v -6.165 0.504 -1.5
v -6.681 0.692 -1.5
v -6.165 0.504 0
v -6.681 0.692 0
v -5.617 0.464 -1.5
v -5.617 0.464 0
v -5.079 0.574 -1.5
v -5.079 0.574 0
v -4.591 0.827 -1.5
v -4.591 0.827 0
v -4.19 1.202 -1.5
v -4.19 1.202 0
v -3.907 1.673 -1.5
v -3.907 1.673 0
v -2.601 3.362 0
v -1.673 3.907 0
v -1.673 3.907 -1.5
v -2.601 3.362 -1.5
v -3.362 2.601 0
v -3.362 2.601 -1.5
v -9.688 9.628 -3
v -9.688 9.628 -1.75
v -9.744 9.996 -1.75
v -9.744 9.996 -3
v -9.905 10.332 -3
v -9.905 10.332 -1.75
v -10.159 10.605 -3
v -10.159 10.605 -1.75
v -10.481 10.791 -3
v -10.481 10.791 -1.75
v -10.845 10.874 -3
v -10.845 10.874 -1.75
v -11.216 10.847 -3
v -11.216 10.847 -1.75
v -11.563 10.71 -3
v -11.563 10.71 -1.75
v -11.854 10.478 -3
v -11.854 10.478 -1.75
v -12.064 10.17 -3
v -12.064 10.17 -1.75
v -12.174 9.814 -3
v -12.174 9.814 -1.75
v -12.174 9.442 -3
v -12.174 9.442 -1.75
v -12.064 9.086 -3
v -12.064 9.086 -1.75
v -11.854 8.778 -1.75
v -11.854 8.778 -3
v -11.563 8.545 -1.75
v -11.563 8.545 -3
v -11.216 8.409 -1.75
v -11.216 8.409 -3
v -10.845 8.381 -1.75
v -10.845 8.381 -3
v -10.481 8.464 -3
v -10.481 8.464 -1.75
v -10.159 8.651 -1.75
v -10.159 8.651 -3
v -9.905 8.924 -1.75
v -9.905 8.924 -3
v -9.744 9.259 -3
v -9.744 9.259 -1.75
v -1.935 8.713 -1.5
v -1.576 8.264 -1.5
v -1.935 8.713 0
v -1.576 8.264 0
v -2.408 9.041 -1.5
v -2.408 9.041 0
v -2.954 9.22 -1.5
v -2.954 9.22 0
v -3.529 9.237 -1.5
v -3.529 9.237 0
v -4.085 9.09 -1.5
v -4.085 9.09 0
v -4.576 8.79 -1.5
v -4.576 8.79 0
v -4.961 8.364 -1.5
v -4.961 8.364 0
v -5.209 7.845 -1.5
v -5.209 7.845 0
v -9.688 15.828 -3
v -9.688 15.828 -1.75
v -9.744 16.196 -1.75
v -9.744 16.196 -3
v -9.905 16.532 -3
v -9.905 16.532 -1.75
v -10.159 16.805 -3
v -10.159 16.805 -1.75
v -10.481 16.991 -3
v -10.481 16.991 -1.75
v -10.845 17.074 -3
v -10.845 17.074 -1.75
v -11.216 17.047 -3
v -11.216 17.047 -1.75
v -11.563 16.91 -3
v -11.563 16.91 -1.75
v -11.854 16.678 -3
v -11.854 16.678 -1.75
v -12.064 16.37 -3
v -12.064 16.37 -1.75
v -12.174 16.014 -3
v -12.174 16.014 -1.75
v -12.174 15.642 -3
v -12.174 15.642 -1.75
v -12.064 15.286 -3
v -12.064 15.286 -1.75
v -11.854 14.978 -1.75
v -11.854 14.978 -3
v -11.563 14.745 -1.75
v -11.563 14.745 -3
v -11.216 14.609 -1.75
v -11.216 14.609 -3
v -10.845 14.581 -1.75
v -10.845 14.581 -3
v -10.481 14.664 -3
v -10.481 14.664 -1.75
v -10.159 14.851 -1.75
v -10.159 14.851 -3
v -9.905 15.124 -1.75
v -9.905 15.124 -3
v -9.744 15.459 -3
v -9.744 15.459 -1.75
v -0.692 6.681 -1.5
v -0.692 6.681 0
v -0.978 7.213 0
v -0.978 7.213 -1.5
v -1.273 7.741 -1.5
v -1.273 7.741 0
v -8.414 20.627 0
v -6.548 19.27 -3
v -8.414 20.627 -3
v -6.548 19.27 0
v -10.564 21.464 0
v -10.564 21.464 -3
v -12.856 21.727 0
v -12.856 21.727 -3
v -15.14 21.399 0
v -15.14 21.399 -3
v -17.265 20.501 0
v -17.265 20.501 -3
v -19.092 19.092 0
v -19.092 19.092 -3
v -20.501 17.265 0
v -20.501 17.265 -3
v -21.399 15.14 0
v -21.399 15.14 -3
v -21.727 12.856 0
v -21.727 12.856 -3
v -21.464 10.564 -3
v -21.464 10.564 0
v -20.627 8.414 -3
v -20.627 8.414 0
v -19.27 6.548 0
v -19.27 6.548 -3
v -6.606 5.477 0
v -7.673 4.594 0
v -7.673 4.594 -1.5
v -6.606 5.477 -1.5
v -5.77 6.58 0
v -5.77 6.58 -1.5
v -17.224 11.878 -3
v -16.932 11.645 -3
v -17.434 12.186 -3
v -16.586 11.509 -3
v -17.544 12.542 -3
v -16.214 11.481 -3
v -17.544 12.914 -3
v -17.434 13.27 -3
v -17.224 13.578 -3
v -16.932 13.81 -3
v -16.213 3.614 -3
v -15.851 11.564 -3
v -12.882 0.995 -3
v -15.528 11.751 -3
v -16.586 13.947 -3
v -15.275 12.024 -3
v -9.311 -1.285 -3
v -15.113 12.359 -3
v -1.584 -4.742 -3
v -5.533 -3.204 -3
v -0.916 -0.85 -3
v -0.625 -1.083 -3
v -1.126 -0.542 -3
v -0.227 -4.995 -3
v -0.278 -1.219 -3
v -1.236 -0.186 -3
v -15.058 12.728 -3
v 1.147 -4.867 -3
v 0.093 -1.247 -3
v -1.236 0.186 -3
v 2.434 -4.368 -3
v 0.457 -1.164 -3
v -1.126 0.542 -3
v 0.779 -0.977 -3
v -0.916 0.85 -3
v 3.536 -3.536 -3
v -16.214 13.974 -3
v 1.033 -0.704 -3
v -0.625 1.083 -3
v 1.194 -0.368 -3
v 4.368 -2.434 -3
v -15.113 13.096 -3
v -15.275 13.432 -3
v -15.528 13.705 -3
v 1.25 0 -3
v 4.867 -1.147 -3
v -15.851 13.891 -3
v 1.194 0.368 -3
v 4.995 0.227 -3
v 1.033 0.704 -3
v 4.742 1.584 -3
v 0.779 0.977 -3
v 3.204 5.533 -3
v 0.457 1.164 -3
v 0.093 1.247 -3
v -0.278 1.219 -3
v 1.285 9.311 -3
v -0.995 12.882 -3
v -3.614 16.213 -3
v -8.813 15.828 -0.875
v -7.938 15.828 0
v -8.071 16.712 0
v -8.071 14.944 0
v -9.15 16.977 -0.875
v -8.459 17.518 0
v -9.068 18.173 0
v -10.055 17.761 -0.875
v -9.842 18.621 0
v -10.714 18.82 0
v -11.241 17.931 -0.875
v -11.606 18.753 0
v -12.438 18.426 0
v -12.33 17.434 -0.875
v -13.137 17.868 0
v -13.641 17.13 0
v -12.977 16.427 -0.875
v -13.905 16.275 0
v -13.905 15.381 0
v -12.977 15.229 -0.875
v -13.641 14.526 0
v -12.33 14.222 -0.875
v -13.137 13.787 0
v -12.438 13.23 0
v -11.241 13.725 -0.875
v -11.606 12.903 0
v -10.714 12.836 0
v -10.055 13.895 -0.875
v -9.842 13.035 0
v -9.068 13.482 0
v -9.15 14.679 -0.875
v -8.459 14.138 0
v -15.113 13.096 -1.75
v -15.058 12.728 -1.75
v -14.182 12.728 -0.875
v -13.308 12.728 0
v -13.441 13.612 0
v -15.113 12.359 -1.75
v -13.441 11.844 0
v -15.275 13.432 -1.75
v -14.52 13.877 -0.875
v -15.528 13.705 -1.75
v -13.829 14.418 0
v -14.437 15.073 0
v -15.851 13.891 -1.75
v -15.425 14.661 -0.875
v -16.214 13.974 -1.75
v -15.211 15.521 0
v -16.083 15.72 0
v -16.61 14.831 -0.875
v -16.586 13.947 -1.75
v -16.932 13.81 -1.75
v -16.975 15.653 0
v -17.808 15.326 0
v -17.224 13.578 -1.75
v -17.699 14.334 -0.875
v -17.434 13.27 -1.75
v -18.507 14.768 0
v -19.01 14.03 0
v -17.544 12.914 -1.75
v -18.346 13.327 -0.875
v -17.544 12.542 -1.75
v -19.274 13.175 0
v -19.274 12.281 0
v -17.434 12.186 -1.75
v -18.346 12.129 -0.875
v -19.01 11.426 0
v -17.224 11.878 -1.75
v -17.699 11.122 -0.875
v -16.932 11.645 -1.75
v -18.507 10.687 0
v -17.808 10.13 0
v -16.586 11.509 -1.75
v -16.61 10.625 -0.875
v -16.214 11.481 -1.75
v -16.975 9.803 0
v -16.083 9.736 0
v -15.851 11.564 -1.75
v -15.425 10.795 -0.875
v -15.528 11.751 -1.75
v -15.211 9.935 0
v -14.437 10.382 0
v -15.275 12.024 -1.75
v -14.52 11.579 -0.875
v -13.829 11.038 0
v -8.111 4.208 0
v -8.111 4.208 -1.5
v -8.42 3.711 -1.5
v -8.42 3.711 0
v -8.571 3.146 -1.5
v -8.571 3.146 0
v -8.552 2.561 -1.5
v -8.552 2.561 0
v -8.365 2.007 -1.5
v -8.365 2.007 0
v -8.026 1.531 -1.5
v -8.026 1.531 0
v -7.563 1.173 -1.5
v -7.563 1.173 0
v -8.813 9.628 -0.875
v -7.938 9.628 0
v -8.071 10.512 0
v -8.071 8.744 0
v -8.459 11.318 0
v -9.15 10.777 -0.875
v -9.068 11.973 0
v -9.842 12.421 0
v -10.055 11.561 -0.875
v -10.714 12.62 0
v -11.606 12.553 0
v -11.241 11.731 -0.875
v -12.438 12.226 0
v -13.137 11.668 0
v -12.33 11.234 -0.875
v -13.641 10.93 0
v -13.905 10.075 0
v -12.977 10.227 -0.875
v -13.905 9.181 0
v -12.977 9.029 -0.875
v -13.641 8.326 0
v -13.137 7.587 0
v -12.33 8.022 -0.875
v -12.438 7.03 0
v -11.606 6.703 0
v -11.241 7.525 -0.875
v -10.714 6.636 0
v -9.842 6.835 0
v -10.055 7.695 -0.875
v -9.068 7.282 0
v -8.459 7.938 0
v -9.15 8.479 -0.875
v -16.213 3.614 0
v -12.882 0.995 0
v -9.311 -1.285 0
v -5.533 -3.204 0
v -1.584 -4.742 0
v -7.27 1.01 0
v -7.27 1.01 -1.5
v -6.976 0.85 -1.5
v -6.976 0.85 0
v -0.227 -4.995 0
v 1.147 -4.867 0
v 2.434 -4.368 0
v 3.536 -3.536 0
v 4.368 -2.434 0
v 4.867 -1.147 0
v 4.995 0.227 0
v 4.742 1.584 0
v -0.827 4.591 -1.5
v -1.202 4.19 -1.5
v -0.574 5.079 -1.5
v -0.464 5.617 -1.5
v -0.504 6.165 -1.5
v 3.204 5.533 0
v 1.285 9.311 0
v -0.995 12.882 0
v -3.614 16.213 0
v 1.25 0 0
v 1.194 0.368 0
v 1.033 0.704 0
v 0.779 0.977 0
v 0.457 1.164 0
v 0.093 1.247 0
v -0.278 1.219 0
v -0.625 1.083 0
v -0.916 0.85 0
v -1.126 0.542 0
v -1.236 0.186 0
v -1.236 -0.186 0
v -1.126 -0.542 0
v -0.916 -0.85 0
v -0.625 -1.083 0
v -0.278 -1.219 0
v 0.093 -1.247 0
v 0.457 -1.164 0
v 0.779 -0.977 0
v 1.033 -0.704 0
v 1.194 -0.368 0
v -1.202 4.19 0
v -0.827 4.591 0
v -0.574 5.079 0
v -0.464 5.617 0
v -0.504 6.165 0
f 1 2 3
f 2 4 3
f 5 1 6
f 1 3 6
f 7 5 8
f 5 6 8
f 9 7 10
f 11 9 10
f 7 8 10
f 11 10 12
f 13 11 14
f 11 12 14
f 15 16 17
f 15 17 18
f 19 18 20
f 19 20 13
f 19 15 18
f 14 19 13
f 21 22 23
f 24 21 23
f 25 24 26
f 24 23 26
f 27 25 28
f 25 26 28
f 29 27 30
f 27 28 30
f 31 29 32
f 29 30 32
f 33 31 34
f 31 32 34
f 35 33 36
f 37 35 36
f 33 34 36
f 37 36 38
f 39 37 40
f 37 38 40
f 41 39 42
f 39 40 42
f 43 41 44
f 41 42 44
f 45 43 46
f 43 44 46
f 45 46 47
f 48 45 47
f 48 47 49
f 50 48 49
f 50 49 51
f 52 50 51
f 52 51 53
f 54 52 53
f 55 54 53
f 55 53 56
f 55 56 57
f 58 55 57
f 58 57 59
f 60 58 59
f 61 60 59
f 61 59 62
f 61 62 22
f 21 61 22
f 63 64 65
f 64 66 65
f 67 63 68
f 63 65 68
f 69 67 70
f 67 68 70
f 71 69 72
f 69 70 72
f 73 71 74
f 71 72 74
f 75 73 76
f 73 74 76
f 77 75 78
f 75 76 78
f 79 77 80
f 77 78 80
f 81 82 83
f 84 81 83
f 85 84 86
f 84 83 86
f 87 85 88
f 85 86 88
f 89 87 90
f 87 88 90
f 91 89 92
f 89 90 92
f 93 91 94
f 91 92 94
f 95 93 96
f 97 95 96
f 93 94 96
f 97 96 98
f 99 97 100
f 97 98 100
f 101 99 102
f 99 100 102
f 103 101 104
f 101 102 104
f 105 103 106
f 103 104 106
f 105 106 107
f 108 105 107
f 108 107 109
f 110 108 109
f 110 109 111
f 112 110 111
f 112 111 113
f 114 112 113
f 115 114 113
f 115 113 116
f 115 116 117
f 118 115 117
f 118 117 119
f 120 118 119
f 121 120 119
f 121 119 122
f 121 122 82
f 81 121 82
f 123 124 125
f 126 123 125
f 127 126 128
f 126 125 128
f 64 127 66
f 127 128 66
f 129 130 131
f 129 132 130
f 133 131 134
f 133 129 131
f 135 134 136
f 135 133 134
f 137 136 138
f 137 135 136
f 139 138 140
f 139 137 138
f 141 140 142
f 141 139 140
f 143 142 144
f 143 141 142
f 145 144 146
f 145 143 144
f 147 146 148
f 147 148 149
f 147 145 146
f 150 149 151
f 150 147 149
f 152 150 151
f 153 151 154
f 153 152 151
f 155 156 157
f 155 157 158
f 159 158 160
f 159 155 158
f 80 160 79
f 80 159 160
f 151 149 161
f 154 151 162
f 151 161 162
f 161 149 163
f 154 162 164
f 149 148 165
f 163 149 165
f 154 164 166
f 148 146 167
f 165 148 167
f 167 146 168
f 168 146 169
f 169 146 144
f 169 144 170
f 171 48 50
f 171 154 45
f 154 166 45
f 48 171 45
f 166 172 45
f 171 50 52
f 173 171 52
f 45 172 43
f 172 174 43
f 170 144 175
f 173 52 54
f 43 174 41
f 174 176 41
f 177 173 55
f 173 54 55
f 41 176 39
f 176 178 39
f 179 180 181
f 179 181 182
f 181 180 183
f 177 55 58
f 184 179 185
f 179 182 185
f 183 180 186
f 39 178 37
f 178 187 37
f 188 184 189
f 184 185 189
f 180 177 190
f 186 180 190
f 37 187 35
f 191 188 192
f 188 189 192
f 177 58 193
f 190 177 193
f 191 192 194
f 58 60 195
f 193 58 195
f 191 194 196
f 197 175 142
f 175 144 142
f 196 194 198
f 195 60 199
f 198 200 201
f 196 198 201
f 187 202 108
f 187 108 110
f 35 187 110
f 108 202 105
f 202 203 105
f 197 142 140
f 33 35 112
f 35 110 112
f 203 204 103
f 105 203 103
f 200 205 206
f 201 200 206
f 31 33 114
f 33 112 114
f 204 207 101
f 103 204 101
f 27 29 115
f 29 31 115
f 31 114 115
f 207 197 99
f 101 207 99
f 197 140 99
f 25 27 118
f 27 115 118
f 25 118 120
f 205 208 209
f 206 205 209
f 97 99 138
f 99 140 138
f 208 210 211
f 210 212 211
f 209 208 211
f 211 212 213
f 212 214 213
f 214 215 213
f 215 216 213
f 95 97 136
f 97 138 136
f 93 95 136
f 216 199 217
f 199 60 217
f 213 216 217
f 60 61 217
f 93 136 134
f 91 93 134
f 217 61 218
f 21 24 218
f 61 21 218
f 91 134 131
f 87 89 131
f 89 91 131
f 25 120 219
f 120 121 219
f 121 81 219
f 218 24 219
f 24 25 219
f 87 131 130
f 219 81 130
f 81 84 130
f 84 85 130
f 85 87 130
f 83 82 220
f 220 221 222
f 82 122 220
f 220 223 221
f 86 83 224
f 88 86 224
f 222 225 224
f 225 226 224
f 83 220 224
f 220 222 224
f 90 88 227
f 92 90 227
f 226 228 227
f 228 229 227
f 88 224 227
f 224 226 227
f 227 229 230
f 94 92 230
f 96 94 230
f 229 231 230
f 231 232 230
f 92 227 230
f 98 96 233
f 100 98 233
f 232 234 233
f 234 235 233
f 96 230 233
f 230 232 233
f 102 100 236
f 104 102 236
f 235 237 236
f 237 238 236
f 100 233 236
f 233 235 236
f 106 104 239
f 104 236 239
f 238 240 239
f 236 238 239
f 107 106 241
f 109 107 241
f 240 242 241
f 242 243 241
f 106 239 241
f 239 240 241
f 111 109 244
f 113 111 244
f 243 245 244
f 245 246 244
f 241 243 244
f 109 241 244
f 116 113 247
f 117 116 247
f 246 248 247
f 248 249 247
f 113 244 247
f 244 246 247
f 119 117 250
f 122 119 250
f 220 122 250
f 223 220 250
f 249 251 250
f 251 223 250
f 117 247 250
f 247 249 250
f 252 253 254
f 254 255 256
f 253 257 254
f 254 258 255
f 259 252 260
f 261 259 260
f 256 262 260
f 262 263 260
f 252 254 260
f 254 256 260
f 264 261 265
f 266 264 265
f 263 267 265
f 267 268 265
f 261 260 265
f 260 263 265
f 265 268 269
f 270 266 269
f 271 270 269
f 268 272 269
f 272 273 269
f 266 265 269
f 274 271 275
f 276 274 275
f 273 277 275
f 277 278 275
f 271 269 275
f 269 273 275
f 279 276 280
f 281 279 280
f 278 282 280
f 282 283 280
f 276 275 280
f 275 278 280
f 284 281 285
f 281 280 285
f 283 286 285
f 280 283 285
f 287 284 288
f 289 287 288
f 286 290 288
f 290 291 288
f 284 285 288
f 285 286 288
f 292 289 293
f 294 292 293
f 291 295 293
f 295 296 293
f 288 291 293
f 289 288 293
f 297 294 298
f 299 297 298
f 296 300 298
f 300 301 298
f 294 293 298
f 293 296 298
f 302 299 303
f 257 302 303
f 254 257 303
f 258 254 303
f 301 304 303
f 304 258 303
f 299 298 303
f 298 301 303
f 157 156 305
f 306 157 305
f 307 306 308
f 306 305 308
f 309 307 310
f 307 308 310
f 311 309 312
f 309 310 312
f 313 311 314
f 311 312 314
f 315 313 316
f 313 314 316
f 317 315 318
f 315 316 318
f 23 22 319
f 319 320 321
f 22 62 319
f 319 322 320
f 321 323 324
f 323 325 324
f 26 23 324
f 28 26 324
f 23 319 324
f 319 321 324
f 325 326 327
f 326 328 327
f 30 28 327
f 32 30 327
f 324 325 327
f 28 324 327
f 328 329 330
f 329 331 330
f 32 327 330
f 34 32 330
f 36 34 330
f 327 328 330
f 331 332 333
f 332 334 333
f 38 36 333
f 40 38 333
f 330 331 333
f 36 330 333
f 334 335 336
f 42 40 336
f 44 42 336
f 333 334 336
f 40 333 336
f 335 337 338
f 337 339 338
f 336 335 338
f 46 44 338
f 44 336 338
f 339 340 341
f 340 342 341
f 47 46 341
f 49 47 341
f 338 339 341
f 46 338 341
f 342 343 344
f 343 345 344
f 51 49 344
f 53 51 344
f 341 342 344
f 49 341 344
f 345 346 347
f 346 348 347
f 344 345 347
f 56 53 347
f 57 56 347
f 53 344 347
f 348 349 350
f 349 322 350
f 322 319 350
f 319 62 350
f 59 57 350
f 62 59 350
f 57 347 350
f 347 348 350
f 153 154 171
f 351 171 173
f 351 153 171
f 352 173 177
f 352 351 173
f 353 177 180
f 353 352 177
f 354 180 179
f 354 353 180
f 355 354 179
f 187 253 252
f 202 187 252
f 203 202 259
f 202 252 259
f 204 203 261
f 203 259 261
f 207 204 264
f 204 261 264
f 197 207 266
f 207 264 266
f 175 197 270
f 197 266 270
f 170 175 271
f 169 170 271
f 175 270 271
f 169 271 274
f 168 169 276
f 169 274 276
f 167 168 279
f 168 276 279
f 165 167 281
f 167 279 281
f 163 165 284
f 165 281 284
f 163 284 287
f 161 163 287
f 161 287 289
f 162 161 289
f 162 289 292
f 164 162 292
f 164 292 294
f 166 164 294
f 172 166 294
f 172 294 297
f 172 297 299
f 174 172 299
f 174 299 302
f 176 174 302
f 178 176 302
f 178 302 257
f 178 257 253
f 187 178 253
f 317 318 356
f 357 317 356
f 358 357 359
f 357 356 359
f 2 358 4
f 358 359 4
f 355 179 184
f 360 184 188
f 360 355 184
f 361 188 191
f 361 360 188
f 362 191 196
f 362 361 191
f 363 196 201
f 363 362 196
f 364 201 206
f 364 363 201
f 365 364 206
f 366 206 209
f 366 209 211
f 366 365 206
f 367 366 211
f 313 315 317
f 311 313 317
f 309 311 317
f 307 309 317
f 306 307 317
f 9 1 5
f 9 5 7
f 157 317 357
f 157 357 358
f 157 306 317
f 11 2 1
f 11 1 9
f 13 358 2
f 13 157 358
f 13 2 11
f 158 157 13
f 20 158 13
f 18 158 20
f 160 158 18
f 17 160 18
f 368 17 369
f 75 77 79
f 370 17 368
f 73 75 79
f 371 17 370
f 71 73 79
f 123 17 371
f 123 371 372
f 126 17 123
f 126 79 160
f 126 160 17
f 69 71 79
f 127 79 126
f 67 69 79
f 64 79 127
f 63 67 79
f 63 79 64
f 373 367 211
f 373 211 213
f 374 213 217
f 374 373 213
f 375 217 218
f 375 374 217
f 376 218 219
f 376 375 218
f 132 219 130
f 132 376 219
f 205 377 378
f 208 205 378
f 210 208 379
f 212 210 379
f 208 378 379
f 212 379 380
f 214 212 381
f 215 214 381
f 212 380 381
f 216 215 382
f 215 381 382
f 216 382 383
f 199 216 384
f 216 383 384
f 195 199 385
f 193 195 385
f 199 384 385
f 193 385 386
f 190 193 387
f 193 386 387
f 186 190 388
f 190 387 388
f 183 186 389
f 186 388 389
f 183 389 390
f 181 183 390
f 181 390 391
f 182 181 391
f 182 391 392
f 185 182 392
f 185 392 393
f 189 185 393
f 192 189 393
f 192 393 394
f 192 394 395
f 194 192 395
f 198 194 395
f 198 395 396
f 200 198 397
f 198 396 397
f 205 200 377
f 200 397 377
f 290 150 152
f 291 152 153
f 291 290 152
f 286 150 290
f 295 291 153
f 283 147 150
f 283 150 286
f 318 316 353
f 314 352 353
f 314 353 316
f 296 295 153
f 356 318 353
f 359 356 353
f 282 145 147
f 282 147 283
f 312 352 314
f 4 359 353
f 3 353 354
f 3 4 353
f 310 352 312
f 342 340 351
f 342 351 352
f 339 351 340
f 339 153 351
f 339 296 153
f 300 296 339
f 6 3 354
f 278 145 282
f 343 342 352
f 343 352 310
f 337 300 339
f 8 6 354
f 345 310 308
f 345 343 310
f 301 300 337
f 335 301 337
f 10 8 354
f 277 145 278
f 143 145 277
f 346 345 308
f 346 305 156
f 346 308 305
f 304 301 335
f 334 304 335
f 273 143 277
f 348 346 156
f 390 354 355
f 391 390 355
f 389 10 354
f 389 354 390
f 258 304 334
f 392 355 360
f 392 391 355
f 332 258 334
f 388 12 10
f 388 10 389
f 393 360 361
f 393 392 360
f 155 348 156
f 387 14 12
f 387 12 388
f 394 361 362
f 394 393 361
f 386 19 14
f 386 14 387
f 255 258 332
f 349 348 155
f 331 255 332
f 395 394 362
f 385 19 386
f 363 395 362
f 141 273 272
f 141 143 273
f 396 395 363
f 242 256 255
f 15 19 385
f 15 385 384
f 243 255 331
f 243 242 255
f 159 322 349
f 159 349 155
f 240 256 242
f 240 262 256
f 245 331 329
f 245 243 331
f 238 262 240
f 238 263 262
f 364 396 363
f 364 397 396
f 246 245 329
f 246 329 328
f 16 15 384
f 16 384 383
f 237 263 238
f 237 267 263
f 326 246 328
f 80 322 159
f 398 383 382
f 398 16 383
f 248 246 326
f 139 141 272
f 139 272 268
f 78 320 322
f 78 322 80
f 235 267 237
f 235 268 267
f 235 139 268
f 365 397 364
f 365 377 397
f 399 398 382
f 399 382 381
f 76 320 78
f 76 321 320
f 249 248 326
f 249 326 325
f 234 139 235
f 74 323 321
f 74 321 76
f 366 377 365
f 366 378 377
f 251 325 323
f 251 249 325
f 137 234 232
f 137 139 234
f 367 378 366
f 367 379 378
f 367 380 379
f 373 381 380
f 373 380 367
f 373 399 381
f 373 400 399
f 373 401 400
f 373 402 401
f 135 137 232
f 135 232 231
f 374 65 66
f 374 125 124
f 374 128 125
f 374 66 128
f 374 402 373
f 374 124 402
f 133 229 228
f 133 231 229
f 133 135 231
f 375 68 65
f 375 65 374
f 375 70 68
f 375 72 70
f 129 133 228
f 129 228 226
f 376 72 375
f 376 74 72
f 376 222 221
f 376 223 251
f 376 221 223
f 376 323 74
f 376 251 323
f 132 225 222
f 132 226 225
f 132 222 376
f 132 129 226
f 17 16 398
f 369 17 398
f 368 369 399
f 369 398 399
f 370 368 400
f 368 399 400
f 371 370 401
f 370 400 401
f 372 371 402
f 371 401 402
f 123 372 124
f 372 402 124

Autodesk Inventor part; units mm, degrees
ref_plane "YZ Plane" through (0, 0, 0) normal (1, 0, 0) x (0, 1, 0)
ref_plane "XZ Plane" through (0, 0, 0) normal (0, 1, 0) x (-1, 0, 0)
ref_plane "XY Plane" through (0, 0, 0) normal (0, 0, 1) x (1, 0, 0)
sketch "Sketch2" plane through (0, 0, 0) normal (0, 0, 1) x (1, 0, 0)
  line L0 (0, 0) -> (-12.7279, 12.7279) construction
  line L1 (0, 0) -> (18, 0) construction
  line L2 (0, 0) -> (-12.7279, 12.7279) construction
  line L3 (-3.5355, -3.5355) -> (-16.2635, 9.1924) construction
  line L4 (-9.1924, 16.2635) -> (3.5355, 3.5355) construction
  arc A0 (-3.5355, -3.5355) -> (-1.5844, -4.7423) centre (0, 0) ccw construction
  arc A1 (-9.1924, 16.2635) -> (-16.2635, 9.1924) centre (-12.7279, 12.7279) ccw
  arc A2 (-6.5476, 19.2704) -> (-19.2704, 6.5476) centre (-12.7279, 12.7279) ccw
  arc A3 (-19.2704, 6.5476) -> (-1.5844, -4.7423) centre (12.0821, 36.1644) ccw
  arc A4 (4.7423, 1.5844) -> (-6.5476, 19.2704) centre (-36.1644, -12.0821) ccw
  arc A5 (-3.9009, 10.972) -> (-6.5476, 19.2704) centre (-12.7279, 12.7279) ccw construction
  arc A6 (-6.364, 6.364) -> (-3.9009, 10.972) centre (-12.7279, 12.7279) ccw construction
  arc A7 (-10.972, 3.9009) -> (-6.364, 6.364) centre (-12.7279, 12.7279) ccw construction
  arc A8 (-19.2704, 6.5476) -> (-10.972, 3.9009) centre (-12.7279, 12.7279) ccw construction
  arc A9 (4.7423, 1.5844) -> (3.5355, 3.5355) centre (0, 0) ccw construction
  circle A10 centre (0, 0) radius 5
  circle A11 centre (0, 0) radius 3.025 construction
  circle A12 centre (0, 0) radius 1.25
  line L5 (0, 0) -> (-12.7279, 12.7279) construction
  line L6 (0, 0) -> (18, 0) construction
  line L7 (0, 0) -> (-12.7279, 12.7279) construction
  line L8 (-3.5355, -3.5355) -> (-16.2635, 9.1924) construction
  line L9 (-9.1924, 16.2635) -> (3.5355, 3.5355) construction
  arc A13 (-3.5355, -3.5355) -> (-1.5844, -4.7423) centre (0, 0) ccw construction
  arc A14 (-9.1924, 16.2635) -> (-16.2635, 9.1924) centre (-12.7279, 12.7279) ccw
  arc A15 (-6.5476, 19.2704) -> (-19.2704, 6.5476) centre (-12.7279, 12.7279) ccw
  circle A16 centre (-10.9381, 15.8279) radius 1.25
  circle A17 centre (-10.9381, 15.8279) radius 3.1 construction
  circle A18 centre (-16.3075, 12.7279) radius 1.25
  circle A19 centre (-16.3075, 12.7279) radius 3.1 construction
  circle A20 centre (-10.9381, 9.6279) radius 1.25
  circle A21 centre (-10.9381, 9.6279) radius 3.1 construction
  arc A22 (-19.2704, 6.5476) -> (-1.5844, -4.7423) centre (12.0821, 36.1644) ccw
  arc A23 (4.7423, 1.5844) -> (-6.5476, 19.2704) centre (-36.1644, -12.0821) ccw
  arc A24 (-3.9009, 10.972) -> (-6.5476, 19.2704) centre (-12.7279, 12.7279) ccw construction
  arc A25 (-6.364, 6.364) -> (-3.9009, 10.972) centre (-12.7279, 12.7279) ccw construction
  arc A26 (-10.972, 3.9009) -> (-6.364, 6.364) centre (-12.7279, 12.7279) ccw construction
  arc A27 (-19.2704, 6.5476) -> (-10.972, 3.9009) centre (-12.7279, 12.7279) ccw construction
  arc A28 (4.7423, 1.5844) -> (3.5355, 3.5355) centre (0, 0) ccw construction
  circle A29 centre (0, 0) radius 5
  circle A30 centre (0, 0) radius 3.025 construction
  circle A31 centre (0, 0) radius 1.25
  point P0 (-6.364, 6.364)
  point P1 (-11.1244, -0.1893)
  point P2 (-6.364, 6.364)
  point P3 (-11.1244, -0.1893)
  point P4 (4.7423, 1.5844)
  point P5 (-1.5844, -4.7423)
  dimension "d47" = 18
  dimension "d48" = 135
  dimension "d49" = 5
  dimension "d50" = 18
  dimension "d54" = 8
  dimension "d55" = 10
  dimension "d56" = 6.05
  dimension "d57" = 2.5
  dimension "d58" = 18
  dimension "d59" = 135
  dimension "d60" = 5
  dimension "d61" = 18
  dimension "d62" = 2.5
  dimension "d63" = 6.2
  dimension "d64" = 360
  dimension "d65" = 8
  dimension "d66" = 10
  dimension "d67" = 6.05
  dimension "d68" = 2.5
extrude "Extrusion2" add sketch "Sketch2" against normal blind 3
chamfer "Chamfer3" distance 1.75 angle 45 3 edges at (-12.1881, 15.8279, 0) (-17.5575, 12.7279, 0) (-12.1881, 9.6279, 0)
sketch "Sketch3" plane through (0, 0, 0) normal (0, 0, 1) x (1, 0, 0)
  circle A0 centre (-10.9381, 9.6279) radius 3 projected
  arc A1 (-19.2704, 6.5476) -> (-1.5844, -4.7423) centre (12.0821, 36.1644) ccw projected
  circle A2 centre (0, 0) radius 1.25 projected
  arc A3 (4.7423, 1.5844) -> (-6.5476, 19.2704) centre (-36.1644, -12.0821) ccw projected
  circle A4 centre (-16.3075, 12.7279) radius 3 projected
  circle A5 centre (-10.9381, 15.8279) radius 3 projected
  arc A6 (-1.5757, 8.2644) -> (-5.2092, 7.8448) centre (-3.2996, 7.2504) ccw
  arc A7 (-7.6726, 4.5944) -> (-7.5631, 1.1727) centre (-6.584, 2.9166) ccw
  arc A8 (-7.6726, 4.5944) -> (-5.2092, 7.8448) centre (-10.9381, 9.6279) ccw
  arc A9 (-7.5631, 1.1727) -> (-6.6808, 0.6917) centre (12.0821, 36.1644) ccw
  arc A10 (-0.6917, 6.6808) -> (-1.5757, 8.2644) centre (-36.1644, -12.0821) ccw
  arc A11 (-6.6808, 0.6917) -> (-3.9071, 1.6726) centre (-5.7457, 2.4596) ccw
  arc A12 (-1.6726, 3.9071) -> (-0.6917, 6.6808) centre (-2.4596, 5.7457) ccw
  arc A13 (-1.6726, 3.9071) -> (-3.9071, 1.6726) centre (0, 0) ccw
  dimension "d77" = 3
  dimension "d78" = 2
  dimension "d79" = 2
  dimension "d80" = 3
  dimension "d81" = 3
  dimension "d82" = 2
  dimension "d83" = 2
  dimension "d84" = 3
extrude "Extrusion3" cut sketch "Sketch3" against normal blind 1.5 contours A10 A12 A13 A11 A9 A7 A8 A6
properties part number "クランク_前" material "Aluminum 2014-T6"
